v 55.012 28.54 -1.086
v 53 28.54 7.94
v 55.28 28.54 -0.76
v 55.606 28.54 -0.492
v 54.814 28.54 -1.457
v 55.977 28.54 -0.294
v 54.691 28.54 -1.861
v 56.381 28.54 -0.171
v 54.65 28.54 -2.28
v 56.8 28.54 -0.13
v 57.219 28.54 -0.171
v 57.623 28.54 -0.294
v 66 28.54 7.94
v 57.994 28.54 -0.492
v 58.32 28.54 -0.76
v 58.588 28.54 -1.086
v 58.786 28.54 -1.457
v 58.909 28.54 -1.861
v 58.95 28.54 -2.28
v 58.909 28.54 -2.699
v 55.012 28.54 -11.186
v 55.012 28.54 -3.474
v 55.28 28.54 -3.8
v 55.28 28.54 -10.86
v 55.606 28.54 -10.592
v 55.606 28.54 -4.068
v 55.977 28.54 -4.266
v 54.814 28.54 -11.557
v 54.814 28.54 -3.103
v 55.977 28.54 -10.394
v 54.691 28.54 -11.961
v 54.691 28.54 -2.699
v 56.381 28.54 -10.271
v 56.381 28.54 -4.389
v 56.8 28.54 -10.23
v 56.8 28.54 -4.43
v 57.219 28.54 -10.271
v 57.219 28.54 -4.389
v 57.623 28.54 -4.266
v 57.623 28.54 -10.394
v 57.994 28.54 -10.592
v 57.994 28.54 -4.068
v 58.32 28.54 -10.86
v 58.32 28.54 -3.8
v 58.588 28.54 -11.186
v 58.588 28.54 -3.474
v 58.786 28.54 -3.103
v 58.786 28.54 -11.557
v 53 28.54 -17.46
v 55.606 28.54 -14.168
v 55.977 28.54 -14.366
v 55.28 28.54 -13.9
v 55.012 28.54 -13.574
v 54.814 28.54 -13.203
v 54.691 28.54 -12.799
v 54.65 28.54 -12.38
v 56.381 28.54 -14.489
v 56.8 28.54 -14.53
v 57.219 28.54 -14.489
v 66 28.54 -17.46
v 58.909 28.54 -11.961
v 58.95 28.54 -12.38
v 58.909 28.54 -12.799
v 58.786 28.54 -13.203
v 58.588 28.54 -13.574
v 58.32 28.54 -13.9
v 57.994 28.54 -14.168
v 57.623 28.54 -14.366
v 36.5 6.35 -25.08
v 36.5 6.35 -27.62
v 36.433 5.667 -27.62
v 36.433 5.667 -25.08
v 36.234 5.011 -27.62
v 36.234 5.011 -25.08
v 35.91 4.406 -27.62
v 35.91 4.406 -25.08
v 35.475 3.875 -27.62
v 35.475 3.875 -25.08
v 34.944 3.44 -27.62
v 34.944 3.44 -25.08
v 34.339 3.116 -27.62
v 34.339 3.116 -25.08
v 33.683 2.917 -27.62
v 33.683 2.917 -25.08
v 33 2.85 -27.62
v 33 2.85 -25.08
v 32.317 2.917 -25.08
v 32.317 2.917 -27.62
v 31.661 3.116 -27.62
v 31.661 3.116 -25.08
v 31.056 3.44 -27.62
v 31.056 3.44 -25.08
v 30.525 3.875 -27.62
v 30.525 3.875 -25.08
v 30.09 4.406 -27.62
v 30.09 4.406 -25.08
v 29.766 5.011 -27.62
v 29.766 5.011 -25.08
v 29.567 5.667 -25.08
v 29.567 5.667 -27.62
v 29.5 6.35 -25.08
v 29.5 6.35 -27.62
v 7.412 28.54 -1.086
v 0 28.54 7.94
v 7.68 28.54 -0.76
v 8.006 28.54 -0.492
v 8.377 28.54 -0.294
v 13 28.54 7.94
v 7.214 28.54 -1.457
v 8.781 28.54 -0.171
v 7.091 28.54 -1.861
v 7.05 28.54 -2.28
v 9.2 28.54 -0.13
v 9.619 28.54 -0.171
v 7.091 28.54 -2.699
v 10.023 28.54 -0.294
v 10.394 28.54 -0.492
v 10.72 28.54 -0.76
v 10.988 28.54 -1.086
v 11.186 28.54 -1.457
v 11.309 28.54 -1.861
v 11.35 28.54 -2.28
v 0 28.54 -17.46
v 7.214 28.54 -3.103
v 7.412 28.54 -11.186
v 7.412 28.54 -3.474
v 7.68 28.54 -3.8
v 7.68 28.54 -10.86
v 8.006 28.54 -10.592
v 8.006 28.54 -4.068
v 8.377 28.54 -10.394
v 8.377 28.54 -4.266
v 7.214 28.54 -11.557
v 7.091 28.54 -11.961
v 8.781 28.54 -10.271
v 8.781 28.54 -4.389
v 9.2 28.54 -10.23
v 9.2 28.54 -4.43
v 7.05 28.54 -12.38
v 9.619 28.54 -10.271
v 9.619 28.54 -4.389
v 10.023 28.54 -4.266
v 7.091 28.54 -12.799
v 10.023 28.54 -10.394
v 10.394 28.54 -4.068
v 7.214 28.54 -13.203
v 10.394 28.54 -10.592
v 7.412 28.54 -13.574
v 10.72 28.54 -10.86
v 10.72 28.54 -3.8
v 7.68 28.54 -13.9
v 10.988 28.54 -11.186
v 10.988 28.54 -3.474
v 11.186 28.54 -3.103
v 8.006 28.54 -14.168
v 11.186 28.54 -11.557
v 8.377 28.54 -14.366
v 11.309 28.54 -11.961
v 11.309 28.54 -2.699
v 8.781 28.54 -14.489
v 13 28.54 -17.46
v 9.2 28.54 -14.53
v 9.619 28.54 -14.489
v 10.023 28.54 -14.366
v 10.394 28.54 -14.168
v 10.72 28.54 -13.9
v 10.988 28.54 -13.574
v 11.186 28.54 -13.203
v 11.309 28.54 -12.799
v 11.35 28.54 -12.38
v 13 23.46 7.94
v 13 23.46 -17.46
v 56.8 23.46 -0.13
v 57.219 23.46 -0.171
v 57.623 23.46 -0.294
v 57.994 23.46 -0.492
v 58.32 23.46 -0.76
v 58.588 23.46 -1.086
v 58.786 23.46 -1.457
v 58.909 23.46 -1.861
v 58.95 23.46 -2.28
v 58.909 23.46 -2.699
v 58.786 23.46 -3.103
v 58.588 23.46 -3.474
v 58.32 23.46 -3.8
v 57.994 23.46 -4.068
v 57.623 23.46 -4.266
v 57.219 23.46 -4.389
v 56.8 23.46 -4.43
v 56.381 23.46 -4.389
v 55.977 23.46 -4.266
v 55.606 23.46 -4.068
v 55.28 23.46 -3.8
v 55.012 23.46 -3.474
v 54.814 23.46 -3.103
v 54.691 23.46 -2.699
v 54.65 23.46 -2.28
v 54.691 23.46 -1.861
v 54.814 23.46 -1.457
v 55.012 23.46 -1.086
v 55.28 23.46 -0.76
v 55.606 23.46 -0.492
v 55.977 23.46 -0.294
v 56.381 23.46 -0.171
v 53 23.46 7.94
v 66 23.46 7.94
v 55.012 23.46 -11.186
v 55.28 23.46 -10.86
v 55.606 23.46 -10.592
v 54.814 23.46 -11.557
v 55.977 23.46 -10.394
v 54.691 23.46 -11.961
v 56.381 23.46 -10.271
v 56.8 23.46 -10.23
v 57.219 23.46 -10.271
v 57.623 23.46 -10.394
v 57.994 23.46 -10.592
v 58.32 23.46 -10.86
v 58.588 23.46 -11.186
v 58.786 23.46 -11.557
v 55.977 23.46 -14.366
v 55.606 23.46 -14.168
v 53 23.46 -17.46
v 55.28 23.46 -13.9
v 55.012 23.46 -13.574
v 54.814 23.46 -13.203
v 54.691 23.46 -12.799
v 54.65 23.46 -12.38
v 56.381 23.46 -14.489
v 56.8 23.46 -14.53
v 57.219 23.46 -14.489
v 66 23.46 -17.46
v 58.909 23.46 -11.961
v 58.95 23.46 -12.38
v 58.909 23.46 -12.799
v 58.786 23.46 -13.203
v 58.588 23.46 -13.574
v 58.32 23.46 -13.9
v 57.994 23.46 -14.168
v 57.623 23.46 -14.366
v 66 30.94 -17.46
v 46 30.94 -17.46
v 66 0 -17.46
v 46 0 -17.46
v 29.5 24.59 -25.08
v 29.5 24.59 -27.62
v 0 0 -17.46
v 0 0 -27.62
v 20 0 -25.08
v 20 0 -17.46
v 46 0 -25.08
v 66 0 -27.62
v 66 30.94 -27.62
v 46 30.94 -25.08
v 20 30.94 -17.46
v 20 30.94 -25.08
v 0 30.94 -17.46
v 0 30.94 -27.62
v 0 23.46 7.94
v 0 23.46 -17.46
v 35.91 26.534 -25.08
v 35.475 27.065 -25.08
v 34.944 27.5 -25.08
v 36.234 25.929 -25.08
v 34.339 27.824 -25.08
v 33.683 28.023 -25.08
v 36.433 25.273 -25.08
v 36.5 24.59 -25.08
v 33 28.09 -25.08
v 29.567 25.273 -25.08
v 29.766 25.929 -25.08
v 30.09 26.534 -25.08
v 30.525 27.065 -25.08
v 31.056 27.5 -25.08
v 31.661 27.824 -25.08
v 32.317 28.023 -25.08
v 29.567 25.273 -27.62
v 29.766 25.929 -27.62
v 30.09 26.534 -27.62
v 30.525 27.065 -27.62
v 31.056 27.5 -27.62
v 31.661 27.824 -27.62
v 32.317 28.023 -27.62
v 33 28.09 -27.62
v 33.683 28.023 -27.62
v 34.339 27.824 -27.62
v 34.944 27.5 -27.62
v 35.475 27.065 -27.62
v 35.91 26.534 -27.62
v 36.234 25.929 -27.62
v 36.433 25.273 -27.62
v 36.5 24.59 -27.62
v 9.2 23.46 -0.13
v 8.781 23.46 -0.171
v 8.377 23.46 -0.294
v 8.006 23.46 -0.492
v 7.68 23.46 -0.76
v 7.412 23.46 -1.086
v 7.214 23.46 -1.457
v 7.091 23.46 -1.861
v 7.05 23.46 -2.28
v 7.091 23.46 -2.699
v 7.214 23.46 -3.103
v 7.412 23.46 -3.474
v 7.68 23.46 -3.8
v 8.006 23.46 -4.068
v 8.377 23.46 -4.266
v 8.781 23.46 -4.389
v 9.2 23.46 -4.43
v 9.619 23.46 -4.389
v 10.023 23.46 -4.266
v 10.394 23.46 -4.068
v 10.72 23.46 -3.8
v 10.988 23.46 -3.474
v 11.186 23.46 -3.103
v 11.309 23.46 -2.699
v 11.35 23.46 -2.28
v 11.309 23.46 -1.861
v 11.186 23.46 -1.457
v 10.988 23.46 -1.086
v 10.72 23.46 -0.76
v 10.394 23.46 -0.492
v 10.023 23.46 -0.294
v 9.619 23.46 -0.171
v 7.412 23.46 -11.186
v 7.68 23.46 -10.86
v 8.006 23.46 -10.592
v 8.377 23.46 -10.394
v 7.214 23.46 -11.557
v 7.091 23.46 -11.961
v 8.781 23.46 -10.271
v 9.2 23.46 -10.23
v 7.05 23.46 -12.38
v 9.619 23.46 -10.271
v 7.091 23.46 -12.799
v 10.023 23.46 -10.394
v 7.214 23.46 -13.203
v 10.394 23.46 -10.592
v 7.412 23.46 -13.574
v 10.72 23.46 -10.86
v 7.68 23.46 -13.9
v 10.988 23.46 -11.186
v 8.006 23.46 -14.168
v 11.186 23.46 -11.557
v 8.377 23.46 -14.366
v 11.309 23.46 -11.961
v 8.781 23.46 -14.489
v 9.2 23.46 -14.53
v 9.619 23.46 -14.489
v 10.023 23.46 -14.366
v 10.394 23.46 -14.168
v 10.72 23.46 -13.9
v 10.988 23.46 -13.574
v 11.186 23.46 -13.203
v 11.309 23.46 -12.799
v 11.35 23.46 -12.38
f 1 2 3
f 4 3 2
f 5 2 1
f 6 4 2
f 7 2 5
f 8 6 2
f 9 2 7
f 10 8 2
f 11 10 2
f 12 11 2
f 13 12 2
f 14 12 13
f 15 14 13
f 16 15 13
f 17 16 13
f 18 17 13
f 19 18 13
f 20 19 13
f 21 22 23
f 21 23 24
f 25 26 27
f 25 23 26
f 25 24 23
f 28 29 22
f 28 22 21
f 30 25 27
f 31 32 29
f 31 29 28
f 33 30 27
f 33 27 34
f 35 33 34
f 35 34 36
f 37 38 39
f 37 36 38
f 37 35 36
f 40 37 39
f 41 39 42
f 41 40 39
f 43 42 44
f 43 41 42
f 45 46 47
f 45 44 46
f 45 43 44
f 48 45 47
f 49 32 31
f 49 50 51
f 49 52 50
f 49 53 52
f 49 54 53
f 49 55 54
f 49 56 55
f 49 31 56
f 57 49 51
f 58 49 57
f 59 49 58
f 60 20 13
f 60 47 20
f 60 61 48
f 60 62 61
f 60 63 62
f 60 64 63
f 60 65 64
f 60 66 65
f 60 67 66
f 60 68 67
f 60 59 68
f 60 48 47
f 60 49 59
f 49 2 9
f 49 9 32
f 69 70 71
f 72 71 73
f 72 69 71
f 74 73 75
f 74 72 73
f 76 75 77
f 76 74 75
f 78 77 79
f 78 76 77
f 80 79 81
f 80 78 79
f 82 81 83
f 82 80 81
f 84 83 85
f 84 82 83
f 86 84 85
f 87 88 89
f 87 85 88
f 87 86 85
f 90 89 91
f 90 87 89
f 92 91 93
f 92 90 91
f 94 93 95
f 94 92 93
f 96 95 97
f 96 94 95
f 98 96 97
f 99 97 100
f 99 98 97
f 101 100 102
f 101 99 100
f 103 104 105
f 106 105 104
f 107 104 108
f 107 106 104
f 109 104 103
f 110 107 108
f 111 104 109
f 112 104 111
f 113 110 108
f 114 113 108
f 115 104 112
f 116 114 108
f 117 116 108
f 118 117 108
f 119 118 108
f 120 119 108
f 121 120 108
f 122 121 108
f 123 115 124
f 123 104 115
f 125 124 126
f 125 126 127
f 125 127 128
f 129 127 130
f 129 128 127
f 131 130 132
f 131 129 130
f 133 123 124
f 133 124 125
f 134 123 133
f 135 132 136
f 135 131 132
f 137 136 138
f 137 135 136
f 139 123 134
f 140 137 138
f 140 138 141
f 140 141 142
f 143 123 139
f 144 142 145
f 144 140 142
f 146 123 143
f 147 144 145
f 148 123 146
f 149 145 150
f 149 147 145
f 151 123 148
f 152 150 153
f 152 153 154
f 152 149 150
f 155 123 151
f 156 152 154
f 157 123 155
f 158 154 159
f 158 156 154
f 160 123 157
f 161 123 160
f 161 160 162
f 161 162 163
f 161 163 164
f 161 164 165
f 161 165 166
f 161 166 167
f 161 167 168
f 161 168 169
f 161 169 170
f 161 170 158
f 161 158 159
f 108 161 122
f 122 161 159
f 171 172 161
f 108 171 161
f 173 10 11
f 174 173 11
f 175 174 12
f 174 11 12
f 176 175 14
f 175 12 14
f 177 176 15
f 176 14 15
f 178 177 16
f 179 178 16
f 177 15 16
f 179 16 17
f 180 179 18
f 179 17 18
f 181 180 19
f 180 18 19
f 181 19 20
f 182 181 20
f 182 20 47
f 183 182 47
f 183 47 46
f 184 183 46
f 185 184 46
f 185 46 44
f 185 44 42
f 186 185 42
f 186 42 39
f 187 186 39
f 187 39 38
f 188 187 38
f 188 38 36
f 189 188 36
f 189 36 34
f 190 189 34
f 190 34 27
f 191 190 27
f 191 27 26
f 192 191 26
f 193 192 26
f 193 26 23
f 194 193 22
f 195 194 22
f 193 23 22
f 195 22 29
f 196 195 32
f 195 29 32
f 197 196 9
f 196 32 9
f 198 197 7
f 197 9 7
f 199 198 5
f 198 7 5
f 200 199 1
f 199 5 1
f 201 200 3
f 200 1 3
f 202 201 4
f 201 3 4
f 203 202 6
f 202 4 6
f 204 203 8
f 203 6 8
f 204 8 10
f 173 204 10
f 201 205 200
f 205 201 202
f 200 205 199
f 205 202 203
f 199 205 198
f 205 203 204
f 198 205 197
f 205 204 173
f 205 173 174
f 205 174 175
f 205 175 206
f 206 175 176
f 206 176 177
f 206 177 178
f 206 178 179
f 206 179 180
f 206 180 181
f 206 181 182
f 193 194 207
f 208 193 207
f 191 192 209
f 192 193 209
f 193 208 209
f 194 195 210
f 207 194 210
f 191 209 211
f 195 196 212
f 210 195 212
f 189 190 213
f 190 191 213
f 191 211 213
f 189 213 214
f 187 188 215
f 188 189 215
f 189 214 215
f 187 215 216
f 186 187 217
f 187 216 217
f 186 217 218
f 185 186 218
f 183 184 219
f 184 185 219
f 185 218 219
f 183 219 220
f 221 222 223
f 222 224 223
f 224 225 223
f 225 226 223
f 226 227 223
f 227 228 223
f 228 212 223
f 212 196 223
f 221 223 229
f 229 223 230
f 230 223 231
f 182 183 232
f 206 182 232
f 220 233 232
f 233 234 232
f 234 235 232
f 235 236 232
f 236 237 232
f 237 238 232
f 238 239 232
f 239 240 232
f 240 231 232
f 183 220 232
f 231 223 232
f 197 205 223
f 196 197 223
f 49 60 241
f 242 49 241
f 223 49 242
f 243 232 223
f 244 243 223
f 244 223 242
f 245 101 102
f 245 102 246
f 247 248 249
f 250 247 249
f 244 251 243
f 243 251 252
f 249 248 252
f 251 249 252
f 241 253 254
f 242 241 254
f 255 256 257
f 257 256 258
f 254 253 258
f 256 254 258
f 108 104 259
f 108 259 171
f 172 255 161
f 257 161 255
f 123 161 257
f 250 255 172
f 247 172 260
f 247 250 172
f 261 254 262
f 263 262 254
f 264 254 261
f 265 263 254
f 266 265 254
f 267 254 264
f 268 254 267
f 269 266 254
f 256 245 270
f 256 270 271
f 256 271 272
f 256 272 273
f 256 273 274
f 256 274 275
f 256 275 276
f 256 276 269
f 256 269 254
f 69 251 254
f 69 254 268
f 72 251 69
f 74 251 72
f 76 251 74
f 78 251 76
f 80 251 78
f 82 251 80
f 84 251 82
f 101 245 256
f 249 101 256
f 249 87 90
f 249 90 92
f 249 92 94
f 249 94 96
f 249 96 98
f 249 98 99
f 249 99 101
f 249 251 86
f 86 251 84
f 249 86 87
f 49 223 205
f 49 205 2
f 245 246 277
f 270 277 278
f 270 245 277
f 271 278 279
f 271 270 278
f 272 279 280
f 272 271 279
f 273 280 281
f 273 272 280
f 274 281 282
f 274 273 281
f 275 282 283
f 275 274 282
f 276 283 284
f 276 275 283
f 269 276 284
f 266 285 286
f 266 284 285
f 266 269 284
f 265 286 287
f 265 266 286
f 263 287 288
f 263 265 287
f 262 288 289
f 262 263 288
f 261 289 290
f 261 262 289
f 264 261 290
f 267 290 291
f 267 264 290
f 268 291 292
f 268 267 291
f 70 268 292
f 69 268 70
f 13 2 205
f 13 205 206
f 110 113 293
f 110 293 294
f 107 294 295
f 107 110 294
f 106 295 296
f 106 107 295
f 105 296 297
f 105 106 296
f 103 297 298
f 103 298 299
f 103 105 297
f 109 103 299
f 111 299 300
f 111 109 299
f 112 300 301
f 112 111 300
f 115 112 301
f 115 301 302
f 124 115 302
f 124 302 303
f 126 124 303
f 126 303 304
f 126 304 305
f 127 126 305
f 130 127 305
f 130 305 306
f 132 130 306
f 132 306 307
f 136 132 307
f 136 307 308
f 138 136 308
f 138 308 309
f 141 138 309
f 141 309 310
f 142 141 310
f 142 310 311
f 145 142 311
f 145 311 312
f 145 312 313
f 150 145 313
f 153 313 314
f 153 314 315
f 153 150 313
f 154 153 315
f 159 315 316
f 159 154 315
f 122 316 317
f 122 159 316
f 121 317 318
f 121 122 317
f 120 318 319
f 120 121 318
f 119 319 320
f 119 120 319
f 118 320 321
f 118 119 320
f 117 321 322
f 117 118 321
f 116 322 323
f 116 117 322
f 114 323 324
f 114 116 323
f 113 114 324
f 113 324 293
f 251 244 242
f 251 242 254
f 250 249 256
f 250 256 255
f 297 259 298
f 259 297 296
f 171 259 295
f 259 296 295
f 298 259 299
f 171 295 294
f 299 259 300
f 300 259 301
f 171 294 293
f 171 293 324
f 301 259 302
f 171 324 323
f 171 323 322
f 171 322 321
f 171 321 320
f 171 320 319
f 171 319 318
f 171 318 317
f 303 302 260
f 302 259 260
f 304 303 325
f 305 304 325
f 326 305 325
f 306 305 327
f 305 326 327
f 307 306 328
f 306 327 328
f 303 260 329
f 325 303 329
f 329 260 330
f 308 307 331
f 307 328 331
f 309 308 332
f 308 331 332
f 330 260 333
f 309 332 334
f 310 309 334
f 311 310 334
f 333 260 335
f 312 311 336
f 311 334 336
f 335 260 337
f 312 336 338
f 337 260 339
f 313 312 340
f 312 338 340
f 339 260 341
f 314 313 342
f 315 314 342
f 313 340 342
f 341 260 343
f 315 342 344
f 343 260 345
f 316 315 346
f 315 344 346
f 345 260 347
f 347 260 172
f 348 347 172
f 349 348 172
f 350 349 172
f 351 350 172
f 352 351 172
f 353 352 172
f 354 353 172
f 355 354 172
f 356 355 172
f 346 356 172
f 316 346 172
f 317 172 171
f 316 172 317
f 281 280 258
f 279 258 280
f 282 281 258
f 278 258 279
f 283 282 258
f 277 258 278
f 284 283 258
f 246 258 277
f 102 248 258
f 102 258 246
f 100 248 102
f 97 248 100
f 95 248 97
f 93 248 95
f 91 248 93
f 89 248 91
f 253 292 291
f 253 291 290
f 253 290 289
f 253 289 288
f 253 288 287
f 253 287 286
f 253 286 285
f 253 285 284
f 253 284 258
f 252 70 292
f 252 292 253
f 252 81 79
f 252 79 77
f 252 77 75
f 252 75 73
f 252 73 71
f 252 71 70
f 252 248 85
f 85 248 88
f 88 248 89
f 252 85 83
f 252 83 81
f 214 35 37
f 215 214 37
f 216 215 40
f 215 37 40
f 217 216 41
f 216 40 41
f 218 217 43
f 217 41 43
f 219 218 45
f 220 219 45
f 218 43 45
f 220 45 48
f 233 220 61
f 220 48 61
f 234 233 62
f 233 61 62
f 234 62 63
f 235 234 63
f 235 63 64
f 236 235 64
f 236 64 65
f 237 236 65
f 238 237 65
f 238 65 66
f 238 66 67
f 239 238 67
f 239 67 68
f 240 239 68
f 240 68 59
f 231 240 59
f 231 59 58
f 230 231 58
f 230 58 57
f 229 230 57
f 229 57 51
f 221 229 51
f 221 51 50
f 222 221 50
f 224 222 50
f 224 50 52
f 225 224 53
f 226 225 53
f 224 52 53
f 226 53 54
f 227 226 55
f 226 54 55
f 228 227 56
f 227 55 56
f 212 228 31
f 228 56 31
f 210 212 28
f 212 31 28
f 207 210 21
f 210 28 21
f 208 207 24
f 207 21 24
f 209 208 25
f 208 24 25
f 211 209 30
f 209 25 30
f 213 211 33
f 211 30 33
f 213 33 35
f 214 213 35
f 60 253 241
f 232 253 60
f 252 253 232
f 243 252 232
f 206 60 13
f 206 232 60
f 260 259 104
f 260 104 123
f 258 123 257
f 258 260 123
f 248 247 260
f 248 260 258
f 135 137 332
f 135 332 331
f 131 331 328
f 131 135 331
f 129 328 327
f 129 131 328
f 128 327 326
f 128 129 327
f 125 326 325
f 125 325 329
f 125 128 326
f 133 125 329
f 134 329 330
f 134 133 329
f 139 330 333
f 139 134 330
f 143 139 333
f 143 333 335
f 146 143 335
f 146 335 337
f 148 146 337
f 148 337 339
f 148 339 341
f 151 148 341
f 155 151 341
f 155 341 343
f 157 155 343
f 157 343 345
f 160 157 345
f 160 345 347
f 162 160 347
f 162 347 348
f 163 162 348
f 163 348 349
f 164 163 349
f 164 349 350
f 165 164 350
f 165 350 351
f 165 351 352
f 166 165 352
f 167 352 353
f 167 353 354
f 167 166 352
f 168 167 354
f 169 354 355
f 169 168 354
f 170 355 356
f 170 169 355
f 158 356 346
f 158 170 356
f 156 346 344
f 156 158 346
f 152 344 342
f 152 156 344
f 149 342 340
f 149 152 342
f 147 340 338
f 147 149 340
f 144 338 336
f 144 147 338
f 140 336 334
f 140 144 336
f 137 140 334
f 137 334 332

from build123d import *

# Parameters (mm, degrees)
SKETCH1_W           = 66
SKETCH1_H           = 27.619999878
BOSS_EXTRUDE1_DEPTH = 2.54
BOSS_EXTRUDE2_DEPTH = 26
SKETCH3_W           = 13
SKETCH3_H           = 5.08
BOSS_EXTRUDE3_DEPTH = 25.4
CUT_EXTRUDE1_REACH  = 78.124
CUT_EXTRUDE3_REACH  = 79.029
SKETCH5_R           = 2.15
BOSS_EXTRUDE4_DEPTH = 2.4
CUT_EXTRUDE4_REACH  = 82.023


with BuildPart() as part:
    # Sketch1 → Boss-Extrude1 (new body)
    with BuildSketch(Plane(origin=(0, 0, 0), x_dir=(1, 0, 0), z_dir=(0, 1, 0))):
        with Locations((33, 13.809999939)):
            Rectangle(SKETCH1_W, SKETCH1_H)
    extrude(amount=BOSS_EXTRUDE1_DEPTH)

    # Sketch2 → Boss-Extrude2 (add)
    with BuildSketch(Plane(origin=(0, 2.54, 0), x_dir=(1, 0, 0), z_dir=(0, 1, 0))):
        Polygon((0, 27.619999878), (66, 27.619999878), (66, 17.459999878), (46, 17.459999878), (46, 25.079999878), (20, 25.079999878), (20, 17.459999878), (0, 17.459999878), align=None)
    extrude(amount=BOSS_EXTRUDE2_DEPTH)

    # Sketch3 → Boss-Extrude3 (add)
    with BuildSketch(Plane.XY.offset(-17.459999878)):
        with Locations((6.5, 26)):
            Rectangle(SKETCH3_W, SKETCH3_H)
        with Locations((59.5, 26)):
            Rectangle(SKETCH3_W, SKETCH3_H)
    extrude(amount=BOSS_EXTRUDE3_DEPTH)

    # Sketch4 → Cut-Extrude1 (cut, up to next)
    with BuildSketch(Plane(origin=(0, 2.54, 0), x_dir=(1, 0, 0), z_dir=(0, 1, 0)), mode=Mode.PRIVATE) as cut_extrude1_sk1:
        Polygon((46, 17.459999878), (66, 17.459999878), (66, 0), (0, 0), (0, 17.459999878), (20, 17.459999878), (20, 25.079999878), (46, 25.079999878), align=None)
    cut_extrude1_tool1 = extrude(cut_extrude1_sk1.sketch, amount=-CUT_EXTRUDE1_REACH, mode=Mode.PRIVATE) & part.part
    add(cut_extrude1_tool1.solids().sort_by_distance((33, 2.54, -10.569661))[0], mode=Mode.SUBTRACT)

    # Sketch5 → Cut-Extrude3 (cut, up to next)
    with BuildSketch(Plane(origin=(0, 28.54, 0), x_dir=(1, 0, 0), z_dir=(0, 1, 0)), mode=Mode.PRIVATE) as cut_extrude3_sk1:
        with Locations(Location((56.8, 12.379999878, 0), (0, 0, 270))):
            Circle(SKETCH5_R)
    cut_extrude3_tool1 = extrude(cut_extrude3_sk1.sketch, amount=-CUT_EXTRUDE3_REACH, mode=Mode.PRIVATE) & part.part
    # Sketch5 → Cut-Extrude3 (cut, up to next)
    with BuildSketch(Plane(origin=(0, 28.54, 0), x_dir=(1, 0, 0), z_dir=(0, 1, 0)), mode=Mode.PRIVATE) as cut_extrude3_sk2:
        with Locations(Location((56.8, 2.279999878, 0), (0, 0, 270))):
            Circle(SKETCH5_R)
    cut_extrude3_tool2 = extrude(cut_extrude3_sk2.sketch, amount=-CUT_EXTRUDE3_REACH, mode=Mode.PRIVATE) & part.part
    cut_extrude3_1 = cut_extrude3_tool1.solids().sort_by_distance((56.8, 28.54, -12.38))[0]
    add(cut_extrude3_1, mode=Mode.SUBTRACT)
    cut_extrude3_2 = cut_extrude3_tool2.solids().sort_by_distance((56.8, 28.54, -2.28))[0]
    add(cut_extrude3_2, mode=Mode.SUBTRACT)
    cut_extrude3 = cut_extrude3_1 + cut_extrude3_2  # Cut-Extrude3 as one shape, for the pattern or mirror that repeats it

    # Mirror1: Cut-Extrude3 across plane
    add(cut_extrude3.mirror(Plane.ZY.offset(-33)), mode=Mode.SUBTRACT)

    # Sketch6 → Boss-Extrude4 (add)
    with BuildSketch(Plane(origin=(0, 28.54, 0), x_dir=(1, 0, 0), z_dir=(0, 1, 0))):
        Polygon((0, 27.619999878), (66, 27.619999878), (66, 17.459999878), (46, 17.459999878), (46, 25.079999878), (20, 25.079999878), (20, 17.459999878), (0, 17.459999878), align=None)
    extrude(amount=BOSS_EXTRUDE4_DEPTH)

    # Sketch7 → Cut-Extrude4 (cut, up to next)
    with BuildSketch(Plane.XY.offset(-25.079999878), mode=Mode.PRIVATE) as cut_extrude4_sk1:
        with BuildLine():
            Line((36.5, 24.59), (36.5, 6.35))
            ThreePointArc((36.5, 6.35), (33, 2.85), (29.5, 6.35))
            Line((29.5, 6.35), (29.5, 24.59))
            ThreePointArc((29.5, 24.59), (33, 28.09), (36.5, 24.59))
        make_face()
    cut_extrude4_tool1 = extrude(cut_extrude4_sk1.sketch, amount=-CUT_EXTRUDE4_REACH, mode=Mode.PRIVATE) & part.part
    add(cut_extrude4_tool1.solids().sort_by_distance((33, 15.47, -25.08))[0], mode=Mode.SUBTRACT)


solid = part.part
